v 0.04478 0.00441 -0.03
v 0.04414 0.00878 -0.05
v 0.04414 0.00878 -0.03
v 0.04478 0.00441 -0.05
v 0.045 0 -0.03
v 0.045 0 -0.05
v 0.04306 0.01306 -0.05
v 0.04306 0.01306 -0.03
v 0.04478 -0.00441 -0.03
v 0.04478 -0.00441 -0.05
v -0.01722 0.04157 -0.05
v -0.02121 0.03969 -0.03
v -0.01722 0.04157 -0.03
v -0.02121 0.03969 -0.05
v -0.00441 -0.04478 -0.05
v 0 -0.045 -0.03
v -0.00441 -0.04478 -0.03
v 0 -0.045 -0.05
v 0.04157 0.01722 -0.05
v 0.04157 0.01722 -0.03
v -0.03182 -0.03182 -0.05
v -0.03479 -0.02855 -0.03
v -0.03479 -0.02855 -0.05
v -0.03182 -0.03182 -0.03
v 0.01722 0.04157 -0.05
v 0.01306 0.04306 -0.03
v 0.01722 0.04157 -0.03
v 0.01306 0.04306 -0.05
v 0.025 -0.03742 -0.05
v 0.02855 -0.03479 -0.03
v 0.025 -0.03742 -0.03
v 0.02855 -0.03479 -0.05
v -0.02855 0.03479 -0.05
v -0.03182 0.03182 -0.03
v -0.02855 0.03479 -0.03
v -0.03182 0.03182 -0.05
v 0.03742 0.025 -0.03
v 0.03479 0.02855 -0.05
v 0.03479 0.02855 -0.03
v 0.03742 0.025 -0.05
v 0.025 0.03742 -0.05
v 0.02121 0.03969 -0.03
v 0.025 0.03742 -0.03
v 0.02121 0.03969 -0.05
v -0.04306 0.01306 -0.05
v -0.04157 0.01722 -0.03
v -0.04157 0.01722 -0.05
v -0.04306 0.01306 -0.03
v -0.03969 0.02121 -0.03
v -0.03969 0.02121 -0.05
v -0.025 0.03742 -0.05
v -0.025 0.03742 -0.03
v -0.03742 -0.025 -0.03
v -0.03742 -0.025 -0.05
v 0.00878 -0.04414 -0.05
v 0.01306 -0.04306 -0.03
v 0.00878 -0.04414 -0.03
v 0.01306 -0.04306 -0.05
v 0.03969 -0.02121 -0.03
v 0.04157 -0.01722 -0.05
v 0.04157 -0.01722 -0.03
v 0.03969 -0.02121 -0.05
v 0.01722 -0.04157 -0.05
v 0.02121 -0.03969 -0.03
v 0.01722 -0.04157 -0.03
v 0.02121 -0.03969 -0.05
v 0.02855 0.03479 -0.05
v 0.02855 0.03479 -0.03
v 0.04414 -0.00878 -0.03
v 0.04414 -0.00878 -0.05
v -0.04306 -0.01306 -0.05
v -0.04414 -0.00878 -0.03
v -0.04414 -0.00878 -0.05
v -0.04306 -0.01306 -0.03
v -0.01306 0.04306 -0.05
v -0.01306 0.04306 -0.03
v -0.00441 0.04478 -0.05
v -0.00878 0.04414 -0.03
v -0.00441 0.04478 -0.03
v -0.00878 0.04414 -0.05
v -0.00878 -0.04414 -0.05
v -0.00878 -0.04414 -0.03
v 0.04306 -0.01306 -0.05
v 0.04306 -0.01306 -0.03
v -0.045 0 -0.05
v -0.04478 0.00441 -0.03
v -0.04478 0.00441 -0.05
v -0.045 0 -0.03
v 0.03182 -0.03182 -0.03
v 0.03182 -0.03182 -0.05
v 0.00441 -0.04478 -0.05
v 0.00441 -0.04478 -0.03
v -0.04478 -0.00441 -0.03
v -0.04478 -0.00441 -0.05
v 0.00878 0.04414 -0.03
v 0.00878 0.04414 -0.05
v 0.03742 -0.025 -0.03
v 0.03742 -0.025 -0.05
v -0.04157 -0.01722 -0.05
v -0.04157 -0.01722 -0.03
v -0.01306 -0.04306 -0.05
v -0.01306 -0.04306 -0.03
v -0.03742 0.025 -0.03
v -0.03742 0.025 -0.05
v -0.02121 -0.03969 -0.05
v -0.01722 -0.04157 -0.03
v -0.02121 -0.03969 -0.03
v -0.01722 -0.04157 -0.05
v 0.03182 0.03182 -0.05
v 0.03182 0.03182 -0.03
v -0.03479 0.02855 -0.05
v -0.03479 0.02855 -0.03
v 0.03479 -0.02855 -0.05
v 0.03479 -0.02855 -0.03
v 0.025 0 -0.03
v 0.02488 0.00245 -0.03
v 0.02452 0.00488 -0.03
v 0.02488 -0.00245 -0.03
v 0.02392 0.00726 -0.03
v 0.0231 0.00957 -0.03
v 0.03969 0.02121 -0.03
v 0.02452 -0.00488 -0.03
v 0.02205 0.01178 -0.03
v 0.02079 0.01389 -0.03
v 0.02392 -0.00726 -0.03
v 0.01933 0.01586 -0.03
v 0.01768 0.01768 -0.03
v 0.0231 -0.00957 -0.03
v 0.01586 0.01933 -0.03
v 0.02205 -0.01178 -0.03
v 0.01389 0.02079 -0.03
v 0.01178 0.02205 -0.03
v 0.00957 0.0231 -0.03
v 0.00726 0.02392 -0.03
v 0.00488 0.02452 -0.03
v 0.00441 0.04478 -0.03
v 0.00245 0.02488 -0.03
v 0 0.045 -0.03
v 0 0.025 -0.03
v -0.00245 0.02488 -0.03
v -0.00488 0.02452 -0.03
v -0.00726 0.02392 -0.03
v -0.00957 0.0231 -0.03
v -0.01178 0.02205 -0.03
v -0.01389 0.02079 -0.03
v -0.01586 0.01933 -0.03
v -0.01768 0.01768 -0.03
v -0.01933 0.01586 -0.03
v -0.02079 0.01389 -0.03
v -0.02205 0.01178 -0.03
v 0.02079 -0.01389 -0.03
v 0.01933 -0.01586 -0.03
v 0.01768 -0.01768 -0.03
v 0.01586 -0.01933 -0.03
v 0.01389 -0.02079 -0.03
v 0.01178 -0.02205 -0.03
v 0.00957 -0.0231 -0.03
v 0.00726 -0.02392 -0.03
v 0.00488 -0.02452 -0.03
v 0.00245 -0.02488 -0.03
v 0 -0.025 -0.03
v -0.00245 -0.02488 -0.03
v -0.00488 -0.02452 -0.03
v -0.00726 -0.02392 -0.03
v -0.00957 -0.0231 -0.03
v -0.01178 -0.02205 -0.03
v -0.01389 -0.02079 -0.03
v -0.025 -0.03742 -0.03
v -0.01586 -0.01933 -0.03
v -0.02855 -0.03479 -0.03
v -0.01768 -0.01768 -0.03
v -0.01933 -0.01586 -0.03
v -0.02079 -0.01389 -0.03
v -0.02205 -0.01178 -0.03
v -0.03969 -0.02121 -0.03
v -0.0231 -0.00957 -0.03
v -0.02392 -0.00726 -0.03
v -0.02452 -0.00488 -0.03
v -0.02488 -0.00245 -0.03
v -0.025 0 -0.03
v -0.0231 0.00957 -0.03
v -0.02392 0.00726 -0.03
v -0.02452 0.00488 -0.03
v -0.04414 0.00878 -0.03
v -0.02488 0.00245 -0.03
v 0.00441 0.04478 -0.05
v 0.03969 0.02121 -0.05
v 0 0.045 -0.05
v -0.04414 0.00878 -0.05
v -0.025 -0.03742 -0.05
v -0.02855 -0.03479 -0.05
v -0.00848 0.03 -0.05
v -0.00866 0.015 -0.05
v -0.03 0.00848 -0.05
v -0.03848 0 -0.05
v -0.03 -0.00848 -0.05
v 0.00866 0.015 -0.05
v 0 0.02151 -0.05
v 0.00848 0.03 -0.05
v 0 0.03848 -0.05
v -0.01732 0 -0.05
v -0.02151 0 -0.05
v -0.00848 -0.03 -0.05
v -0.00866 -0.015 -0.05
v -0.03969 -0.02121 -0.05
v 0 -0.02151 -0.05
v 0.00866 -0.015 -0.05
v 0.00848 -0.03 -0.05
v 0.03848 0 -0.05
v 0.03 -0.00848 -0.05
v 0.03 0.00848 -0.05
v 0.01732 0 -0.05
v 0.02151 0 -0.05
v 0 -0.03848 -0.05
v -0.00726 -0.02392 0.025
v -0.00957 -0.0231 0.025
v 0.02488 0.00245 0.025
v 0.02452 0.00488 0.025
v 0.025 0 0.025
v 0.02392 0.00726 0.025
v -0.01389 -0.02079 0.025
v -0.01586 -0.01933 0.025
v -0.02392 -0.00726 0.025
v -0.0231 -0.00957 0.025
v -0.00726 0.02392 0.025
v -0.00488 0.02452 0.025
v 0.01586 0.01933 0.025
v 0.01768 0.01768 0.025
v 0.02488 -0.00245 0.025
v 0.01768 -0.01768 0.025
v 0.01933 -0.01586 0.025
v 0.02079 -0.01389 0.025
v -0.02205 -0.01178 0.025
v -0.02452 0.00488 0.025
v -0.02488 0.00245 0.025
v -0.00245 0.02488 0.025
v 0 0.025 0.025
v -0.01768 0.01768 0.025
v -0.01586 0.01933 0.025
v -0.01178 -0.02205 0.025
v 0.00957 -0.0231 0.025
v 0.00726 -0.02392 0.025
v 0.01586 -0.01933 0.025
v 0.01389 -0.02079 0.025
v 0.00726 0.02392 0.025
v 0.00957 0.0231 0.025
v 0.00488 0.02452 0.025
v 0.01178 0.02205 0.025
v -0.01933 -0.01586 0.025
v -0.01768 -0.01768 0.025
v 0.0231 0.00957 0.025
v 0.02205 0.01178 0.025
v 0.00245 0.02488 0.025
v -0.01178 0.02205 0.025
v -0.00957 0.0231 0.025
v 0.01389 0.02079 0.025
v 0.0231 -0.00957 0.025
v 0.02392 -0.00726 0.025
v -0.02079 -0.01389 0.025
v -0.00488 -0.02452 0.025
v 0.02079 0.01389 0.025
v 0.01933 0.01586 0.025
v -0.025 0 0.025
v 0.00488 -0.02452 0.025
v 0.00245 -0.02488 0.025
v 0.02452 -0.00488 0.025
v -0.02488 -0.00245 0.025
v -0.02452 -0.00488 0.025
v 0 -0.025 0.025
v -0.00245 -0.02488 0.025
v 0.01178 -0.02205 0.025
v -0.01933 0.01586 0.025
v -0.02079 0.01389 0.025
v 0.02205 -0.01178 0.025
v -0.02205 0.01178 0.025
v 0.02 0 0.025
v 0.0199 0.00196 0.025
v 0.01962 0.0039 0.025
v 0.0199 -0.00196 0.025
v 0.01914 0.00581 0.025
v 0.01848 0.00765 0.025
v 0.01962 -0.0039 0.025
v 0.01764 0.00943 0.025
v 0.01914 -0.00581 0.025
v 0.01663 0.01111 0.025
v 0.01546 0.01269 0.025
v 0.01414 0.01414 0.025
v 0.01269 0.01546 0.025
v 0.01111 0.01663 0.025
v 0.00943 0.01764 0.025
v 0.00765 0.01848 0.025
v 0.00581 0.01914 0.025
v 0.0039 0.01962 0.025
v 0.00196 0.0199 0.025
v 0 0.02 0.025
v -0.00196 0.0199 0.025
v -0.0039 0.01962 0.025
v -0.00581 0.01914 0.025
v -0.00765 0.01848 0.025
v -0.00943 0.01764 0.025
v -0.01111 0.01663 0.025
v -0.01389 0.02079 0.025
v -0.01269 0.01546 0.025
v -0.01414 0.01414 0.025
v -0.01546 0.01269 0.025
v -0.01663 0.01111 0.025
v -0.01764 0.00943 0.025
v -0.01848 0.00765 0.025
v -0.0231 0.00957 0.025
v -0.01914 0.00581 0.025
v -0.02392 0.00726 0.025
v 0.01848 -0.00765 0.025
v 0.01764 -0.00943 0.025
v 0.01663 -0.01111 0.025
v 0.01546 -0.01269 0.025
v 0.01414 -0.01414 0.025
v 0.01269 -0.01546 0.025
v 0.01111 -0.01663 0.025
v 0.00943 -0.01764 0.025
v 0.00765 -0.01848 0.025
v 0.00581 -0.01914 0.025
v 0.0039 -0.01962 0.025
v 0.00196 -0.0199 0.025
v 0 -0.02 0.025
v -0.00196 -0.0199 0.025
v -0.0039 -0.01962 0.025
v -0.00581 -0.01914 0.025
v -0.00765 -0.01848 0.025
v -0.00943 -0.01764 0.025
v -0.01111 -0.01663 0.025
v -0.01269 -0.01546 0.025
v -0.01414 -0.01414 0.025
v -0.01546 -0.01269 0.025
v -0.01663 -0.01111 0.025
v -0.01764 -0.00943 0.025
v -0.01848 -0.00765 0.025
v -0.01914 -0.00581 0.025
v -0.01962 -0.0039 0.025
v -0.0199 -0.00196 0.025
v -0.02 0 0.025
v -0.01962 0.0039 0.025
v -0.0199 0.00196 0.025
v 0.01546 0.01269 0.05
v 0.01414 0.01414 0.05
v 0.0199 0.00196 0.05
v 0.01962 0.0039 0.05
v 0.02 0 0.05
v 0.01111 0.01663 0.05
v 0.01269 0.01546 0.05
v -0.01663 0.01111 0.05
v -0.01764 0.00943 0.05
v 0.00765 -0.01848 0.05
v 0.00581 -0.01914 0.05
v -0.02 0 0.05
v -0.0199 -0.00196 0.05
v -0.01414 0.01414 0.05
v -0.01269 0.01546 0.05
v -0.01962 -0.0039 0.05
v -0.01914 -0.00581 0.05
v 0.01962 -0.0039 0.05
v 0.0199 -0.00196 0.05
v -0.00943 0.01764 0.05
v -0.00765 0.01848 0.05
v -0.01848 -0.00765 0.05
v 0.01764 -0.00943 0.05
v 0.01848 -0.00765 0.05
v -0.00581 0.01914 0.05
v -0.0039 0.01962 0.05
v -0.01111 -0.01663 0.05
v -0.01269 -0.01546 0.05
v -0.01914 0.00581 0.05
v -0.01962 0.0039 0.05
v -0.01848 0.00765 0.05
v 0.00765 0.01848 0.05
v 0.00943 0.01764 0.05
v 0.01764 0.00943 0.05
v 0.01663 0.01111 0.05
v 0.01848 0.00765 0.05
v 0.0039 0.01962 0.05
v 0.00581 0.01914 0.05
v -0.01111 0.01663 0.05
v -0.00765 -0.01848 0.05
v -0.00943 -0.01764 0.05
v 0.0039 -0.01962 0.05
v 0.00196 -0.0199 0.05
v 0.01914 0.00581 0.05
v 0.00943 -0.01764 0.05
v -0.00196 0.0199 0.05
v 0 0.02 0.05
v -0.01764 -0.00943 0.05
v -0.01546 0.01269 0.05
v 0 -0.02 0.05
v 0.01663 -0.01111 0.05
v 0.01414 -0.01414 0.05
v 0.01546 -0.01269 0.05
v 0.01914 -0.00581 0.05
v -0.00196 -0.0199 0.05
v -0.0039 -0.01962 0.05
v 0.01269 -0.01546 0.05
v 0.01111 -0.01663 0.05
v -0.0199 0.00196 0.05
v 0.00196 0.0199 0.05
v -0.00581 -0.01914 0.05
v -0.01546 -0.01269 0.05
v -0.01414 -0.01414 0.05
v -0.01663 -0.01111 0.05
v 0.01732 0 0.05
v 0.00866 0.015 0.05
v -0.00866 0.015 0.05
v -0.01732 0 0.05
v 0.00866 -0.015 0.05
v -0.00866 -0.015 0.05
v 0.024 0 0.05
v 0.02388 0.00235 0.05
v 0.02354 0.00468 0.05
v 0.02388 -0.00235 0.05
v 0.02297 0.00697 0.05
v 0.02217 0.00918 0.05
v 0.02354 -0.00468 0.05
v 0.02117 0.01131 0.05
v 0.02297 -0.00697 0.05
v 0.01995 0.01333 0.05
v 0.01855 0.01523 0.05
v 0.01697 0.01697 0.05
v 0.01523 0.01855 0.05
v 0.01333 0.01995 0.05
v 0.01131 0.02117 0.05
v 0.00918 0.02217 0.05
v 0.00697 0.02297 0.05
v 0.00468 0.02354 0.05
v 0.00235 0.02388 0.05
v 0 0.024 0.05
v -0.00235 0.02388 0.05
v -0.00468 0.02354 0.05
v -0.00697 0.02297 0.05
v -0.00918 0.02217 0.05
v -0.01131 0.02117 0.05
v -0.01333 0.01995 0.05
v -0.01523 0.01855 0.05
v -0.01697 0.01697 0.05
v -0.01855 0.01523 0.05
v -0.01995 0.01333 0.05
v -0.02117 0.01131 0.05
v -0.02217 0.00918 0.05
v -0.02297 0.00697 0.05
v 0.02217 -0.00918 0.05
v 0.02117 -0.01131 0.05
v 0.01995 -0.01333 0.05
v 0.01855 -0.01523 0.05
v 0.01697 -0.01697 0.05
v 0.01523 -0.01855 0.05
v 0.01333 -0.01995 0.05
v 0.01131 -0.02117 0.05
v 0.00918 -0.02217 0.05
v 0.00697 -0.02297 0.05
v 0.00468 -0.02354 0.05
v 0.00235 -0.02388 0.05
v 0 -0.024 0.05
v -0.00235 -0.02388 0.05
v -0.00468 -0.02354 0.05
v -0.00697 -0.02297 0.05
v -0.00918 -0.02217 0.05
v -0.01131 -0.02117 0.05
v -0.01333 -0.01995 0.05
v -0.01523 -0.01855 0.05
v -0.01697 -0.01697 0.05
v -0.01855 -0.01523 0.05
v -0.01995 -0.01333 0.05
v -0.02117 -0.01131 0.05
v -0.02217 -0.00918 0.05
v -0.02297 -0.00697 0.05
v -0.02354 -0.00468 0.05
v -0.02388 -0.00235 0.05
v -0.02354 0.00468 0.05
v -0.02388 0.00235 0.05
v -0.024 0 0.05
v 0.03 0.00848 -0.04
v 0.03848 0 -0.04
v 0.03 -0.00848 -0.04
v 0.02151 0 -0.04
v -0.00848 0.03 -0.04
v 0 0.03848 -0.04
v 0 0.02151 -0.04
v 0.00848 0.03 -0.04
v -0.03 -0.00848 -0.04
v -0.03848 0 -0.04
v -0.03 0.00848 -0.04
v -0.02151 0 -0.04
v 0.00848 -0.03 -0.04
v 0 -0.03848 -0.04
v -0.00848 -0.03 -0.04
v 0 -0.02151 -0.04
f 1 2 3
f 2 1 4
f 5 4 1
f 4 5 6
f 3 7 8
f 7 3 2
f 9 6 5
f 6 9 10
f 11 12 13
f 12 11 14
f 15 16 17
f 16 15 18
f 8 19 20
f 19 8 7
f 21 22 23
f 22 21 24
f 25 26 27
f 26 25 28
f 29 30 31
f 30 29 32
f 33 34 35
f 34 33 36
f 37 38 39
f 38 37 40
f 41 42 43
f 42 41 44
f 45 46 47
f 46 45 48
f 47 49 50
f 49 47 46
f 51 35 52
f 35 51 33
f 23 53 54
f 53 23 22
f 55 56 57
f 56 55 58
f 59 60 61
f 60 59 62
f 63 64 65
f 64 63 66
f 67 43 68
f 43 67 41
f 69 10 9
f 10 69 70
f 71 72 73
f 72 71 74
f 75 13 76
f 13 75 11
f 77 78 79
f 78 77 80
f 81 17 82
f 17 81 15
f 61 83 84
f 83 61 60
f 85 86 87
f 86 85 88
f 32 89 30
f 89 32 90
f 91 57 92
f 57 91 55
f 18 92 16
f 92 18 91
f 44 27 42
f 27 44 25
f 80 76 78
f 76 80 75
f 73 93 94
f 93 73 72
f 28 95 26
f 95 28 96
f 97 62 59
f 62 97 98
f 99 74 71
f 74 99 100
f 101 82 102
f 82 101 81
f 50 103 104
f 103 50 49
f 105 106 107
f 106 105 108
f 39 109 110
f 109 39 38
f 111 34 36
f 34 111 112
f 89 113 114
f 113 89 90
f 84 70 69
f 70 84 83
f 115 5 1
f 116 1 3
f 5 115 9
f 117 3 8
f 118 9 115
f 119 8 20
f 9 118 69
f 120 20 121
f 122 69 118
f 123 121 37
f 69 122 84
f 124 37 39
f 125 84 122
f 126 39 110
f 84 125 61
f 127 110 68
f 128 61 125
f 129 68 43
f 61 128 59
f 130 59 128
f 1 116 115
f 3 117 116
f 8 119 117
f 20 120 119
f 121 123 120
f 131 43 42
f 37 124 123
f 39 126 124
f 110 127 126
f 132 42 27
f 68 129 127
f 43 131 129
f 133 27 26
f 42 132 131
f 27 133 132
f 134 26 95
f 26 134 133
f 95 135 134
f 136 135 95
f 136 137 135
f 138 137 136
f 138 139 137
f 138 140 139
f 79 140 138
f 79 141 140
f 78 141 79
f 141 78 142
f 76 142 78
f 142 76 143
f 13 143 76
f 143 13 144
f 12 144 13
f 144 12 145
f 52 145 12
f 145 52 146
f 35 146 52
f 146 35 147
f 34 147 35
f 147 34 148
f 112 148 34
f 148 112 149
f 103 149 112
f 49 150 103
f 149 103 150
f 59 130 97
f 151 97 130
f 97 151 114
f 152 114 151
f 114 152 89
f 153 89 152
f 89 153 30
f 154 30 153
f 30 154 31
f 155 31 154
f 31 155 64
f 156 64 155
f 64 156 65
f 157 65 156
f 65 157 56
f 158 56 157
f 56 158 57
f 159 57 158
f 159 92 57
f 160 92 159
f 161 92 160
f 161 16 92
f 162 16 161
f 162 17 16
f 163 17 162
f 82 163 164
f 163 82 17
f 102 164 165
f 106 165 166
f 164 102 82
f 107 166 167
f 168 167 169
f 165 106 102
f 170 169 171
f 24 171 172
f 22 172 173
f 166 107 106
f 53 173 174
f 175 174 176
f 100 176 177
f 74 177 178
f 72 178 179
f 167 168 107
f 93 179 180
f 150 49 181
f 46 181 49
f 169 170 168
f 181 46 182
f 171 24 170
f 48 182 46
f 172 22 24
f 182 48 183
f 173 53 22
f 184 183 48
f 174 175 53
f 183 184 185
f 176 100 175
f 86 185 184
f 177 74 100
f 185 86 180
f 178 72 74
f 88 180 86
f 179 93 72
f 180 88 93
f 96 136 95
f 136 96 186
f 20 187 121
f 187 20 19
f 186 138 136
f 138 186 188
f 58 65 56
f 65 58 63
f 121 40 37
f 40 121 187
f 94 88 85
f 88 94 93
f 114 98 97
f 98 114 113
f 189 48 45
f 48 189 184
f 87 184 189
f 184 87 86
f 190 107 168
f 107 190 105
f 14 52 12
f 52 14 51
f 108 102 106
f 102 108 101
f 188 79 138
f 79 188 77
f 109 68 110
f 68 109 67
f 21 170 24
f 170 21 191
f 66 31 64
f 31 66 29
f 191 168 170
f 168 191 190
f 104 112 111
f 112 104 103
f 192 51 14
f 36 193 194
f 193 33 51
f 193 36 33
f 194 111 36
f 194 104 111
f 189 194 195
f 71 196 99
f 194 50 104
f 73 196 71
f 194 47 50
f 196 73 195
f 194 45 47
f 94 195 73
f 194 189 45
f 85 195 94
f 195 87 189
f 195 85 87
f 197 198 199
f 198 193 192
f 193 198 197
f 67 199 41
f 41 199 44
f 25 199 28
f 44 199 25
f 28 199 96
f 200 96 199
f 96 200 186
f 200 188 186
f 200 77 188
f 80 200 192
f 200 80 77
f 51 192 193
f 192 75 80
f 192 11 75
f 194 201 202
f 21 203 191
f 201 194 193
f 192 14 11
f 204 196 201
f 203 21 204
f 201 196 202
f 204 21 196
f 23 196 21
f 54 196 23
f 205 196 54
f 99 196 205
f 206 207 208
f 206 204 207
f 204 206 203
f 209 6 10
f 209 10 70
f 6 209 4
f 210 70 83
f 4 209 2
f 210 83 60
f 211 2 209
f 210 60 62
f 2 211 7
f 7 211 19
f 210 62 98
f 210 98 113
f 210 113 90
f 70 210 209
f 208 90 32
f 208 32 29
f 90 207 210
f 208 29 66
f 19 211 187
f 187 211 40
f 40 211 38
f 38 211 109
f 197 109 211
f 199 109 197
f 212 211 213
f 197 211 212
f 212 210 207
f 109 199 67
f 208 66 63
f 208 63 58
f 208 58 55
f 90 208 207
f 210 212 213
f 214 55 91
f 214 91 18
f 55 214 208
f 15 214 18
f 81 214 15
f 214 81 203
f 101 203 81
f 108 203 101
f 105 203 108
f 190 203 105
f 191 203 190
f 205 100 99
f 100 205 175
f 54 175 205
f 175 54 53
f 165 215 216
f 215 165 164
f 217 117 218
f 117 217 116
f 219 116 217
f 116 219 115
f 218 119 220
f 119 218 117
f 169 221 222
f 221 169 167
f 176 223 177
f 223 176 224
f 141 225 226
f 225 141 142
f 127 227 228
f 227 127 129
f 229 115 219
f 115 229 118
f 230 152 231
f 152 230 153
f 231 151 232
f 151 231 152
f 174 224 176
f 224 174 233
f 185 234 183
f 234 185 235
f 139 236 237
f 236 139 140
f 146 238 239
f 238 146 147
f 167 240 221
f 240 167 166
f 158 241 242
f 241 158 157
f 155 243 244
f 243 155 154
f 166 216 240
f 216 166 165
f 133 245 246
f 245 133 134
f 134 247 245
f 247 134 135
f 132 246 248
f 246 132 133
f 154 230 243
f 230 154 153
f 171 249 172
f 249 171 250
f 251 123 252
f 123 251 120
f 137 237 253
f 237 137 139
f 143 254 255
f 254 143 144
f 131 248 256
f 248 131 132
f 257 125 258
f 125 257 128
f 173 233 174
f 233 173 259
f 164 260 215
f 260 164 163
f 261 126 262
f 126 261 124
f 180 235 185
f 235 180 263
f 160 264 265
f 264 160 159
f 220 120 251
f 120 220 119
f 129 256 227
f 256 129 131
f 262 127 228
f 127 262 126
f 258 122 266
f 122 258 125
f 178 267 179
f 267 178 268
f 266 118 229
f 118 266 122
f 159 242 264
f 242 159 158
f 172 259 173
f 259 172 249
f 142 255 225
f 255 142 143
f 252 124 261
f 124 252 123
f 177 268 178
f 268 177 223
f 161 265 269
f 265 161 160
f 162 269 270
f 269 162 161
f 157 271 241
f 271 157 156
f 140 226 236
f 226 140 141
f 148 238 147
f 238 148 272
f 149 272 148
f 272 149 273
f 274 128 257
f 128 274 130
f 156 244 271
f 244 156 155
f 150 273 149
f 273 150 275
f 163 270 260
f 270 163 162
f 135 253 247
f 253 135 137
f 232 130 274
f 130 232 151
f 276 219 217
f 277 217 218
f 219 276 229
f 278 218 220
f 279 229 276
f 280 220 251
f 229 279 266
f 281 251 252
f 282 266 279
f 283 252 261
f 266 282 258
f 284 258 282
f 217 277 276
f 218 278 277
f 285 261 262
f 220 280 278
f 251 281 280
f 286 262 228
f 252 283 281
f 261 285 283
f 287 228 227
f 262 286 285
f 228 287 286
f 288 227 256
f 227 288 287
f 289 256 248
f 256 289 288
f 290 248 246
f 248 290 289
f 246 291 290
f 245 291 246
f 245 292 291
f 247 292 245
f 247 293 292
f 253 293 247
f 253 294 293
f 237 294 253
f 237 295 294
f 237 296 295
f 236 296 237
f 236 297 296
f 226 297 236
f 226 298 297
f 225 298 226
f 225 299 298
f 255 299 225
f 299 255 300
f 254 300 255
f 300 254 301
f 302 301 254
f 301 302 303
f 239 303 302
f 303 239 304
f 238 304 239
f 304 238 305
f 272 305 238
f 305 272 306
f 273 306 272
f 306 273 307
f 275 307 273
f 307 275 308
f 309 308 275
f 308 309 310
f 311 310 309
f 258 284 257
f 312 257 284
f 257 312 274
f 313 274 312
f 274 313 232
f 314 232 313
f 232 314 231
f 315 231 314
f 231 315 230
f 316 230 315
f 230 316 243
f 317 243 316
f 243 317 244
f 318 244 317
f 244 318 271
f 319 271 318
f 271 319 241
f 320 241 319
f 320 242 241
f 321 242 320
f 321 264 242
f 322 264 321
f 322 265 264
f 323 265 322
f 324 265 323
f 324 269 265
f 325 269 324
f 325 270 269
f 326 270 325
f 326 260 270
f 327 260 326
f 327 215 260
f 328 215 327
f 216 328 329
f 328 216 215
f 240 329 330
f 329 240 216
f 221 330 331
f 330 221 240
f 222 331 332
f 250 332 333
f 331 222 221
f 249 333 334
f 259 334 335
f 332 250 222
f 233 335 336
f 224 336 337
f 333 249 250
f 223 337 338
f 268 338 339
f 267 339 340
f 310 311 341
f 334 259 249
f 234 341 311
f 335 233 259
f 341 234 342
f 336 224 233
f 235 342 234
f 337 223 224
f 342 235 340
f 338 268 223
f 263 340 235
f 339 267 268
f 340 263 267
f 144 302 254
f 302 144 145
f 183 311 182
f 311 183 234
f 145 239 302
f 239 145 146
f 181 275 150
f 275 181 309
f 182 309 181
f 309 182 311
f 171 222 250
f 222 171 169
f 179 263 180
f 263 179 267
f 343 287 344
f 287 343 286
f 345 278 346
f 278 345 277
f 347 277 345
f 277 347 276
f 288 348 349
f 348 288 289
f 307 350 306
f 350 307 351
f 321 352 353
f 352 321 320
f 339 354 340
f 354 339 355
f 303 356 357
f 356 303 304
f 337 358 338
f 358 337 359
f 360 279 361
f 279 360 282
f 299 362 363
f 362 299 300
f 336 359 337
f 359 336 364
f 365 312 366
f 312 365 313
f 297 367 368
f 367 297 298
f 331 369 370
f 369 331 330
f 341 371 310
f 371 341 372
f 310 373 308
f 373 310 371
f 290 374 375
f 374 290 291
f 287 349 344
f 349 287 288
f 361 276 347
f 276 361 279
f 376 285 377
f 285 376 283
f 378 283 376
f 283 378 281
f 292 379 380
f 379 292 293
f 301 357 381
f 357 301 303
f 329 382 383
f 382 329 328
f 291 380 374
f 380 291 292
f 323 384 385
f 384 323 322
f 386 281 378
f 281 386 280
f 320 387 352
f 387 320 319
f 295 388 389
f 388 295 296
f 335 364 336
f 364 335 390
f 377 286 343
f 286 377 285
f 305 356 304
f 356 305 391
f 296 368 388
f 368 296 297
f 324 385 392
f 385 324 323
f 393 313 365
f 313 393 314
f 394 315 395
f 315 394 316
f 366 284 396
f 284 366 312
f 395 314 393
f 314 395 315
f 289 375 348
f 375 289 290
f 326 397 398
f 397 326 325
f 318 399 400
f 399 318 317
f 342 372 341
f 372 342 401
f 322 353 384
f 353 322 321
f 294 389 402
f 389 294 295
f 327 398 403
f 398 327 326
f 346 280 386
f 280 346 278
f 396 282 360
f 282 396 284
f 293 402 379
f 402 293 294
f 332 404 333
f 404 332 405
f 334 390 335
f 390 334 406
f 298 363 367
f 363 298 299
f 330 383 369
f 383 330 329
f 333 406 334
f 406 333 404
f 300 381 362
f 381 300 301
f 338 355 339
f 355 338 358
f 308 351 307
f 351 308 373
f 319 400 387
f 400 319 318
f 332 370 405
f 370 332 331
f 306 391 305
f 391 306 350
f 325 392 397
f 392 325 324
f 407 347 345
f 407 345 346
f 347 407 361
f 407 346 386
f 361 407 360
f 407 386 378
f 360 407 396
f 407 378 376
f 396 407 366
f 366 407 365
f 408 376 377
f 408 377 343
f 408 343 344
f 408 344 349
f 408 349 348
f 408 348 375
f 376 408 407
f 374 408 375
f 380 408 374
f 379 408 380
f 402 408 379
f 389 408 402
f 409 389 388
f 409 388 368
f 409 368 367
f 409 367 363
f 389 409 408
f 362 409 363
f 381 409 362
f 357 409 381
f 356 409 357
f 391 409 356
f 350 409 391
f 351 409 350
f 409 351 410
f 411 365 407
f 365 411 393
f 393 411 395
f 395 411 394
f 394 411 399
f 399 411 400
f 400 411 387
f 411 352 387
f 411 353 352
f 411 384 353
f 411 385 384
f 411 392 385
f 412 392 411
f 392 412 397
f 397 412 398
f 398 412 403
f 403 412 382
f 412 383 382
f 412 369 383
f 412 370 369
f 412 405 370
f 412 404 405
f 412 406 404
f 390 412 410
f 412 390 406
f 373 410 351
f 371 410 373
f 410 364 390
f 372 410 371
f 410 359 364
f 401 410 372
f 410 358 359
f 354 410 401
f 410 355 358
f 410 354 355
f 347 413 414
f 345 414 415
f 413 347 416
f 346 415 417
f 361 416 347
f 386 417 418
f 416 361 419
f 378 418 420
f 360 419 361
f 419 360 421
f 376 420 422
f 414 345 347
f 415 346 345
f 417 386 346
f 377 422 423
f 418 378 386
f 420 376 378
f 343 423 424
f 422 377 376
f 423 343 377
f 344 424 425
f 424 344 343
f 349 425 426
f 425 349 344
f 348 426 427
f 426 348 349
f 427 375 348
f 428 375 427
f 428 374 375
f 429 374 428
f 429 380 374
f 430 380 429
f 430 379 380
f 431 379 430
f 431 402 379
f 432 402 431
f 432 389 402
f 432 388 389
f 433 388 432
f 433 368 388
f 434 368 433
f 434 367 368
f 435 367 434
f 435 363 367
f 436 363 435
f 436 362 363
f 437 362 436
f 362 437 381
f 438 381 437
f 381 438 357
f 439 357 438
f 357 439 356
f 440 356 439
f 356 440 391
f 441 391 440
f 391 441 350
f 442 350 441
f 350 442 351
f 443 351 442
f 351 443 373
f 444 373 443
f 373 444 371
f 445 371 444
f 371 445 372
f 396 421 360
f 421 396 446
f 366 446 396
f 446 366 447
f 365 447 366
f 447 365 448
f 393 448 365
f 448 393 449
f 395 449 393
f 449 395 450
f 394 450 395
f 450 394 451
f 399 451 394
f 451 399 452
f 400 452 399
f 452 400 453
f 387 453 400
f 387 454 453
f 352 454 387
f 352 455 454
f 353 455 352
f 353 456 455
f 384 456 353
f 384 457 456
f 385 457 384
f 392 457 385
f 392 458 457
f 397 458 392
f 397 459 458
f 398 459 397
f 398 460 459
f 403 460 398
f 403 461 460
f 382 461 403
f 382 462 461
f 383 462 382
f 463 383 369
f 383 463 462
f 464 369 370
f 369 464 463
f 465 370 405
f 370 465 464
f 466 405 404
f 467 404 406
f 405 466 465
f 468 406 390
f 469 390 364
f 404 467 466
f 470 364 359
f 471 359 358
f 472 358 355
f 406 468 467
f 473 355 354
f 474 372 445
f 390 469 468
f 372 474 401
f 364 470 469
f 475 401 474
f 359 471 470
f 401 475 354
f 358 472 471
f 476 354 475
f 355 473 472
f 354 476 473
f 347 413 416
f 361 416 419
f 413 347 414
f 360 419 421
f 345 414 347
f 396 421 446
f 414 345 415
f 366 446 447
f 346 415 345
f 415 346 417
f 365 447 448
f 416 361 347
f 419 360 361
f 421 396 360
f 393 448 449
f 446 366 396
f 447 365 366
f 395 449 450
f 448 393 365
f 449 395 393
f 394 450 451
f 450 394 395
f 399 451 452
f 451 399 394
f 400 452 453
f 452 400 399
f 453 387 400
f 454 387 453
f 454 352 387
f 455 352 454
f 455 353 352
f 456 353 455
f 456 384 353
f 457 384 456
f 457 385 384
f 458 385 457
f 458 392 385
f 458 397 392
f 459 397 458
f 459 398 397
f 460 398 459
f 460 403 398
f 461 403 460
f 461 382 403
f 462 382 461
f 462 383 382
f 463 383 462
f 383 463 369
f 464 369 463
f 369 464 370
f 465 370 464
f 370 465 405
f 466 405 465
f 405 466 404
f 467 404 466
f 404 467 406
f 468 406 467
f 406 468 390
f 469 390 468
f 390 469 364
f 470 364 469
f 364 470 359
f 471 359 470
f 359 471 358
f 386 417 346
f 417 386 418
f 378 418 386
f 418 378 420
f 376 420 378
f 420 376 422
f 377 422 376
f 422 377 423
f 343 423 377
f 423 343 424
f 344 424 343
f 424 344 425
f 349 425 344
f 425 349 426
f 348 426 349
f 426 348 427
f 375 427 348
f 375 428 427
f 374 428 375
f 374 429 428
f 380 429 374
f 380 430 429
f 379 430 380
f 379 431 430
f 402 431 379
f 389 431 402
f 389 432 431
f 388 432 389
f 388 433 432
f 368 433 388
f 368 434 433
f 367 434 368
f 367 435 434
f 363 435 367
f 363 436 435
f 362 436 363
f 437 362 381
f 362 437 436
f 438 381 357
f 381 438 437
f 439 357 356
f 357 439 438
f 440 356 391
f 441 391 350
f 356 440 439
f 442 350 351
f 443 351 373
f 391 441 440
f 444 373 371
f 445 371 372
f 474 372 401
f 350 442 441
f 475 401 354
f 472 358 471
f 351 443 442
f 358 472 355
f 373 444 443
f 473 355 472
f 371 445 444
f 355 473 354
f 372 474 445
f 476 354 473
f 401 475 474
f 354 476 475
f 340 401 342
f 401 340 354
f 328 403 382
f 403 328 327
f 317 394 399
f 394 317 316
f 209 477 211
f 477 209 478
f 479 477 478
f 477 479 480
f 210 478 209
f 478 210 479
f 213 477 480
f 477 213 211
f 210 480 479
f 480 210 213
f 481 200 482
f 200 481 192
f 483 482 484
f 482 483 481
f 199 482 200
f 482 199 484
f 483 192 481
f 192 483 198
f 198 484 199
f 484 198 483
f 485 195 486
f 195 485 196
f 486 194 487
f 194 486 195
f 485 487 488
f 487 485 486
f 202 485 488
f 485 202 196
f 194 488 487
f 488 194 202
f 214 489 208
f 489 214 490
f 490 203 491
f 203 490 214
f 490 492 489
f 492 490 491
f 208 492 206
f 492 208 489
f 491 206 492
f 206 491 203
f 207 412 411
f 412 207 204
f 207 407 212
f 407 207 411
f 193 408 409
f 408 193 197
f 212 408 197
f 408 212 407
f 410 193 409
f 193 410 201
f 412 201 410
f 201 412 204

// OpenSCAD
$fn=64;

bbox = [0.1,0.1,0.1];

module hex_prism(flat_d=0.03, h=0.12){
    r = flat_d / sqrt(3);
    cylinder(h=h, r=r, $fn=6, center=true);
}

module diamond_cutout(size=0.012, depth=0.01){
    linear_extrude(height=depth, center=false, convexity=10)
        rotate(45)
            square([size, size], center=true);
}

module hub_body(){
    flange_d = 0.09;
    flange_t = 0.02;

    body_d1 = 0.05;
    body_h1 = 0.055;

    body_d2 = 0.04;
    body_h2 = 0.025;

    collar_d = 0.048;
    collar_h = 0.01;

    union(){
        translate([0,0,-0.05 + flange_t/2])
            cylinder(h=flange_t, d=flange_d, center=true);

        translate([0,0,-0.05 + flange_t + body_h1/2])
            cylinder(h=body_h1, d=body_d1, center=true);

        translate([0,0,-0.05 + flange_t + body_h1 + body_h2/2])
            cylinder(h=body_h2, d=body_d2, center=true);

        translate([0,0,-0.05 + flange_t + body_h1 + body_h2 + collar_h/2])
            cylinder(h=collar_h, d=collar_d, center=true);
    }
}

module part(){
    difference(){
        hub_body();

        hex_flat = 0.03;
        translate([0,0,0])
            hex_prism(flat_d=hex_flat, h=0.14);

        flange_t = 0.02;
        z0 = -0.05;
        recess_depth = 0.01;
        recess_size = 0.012;
        rpos = 0.03;

        for(i=[0:3]){
            rotate([0,0,i*90])
                translate([rpos,0,z0])
                    diamond_cutout(size=recess_size, depth=recess_depth);
        }
    }
}

intersection(){
    part();
    cube(bbox, center=true);
}
